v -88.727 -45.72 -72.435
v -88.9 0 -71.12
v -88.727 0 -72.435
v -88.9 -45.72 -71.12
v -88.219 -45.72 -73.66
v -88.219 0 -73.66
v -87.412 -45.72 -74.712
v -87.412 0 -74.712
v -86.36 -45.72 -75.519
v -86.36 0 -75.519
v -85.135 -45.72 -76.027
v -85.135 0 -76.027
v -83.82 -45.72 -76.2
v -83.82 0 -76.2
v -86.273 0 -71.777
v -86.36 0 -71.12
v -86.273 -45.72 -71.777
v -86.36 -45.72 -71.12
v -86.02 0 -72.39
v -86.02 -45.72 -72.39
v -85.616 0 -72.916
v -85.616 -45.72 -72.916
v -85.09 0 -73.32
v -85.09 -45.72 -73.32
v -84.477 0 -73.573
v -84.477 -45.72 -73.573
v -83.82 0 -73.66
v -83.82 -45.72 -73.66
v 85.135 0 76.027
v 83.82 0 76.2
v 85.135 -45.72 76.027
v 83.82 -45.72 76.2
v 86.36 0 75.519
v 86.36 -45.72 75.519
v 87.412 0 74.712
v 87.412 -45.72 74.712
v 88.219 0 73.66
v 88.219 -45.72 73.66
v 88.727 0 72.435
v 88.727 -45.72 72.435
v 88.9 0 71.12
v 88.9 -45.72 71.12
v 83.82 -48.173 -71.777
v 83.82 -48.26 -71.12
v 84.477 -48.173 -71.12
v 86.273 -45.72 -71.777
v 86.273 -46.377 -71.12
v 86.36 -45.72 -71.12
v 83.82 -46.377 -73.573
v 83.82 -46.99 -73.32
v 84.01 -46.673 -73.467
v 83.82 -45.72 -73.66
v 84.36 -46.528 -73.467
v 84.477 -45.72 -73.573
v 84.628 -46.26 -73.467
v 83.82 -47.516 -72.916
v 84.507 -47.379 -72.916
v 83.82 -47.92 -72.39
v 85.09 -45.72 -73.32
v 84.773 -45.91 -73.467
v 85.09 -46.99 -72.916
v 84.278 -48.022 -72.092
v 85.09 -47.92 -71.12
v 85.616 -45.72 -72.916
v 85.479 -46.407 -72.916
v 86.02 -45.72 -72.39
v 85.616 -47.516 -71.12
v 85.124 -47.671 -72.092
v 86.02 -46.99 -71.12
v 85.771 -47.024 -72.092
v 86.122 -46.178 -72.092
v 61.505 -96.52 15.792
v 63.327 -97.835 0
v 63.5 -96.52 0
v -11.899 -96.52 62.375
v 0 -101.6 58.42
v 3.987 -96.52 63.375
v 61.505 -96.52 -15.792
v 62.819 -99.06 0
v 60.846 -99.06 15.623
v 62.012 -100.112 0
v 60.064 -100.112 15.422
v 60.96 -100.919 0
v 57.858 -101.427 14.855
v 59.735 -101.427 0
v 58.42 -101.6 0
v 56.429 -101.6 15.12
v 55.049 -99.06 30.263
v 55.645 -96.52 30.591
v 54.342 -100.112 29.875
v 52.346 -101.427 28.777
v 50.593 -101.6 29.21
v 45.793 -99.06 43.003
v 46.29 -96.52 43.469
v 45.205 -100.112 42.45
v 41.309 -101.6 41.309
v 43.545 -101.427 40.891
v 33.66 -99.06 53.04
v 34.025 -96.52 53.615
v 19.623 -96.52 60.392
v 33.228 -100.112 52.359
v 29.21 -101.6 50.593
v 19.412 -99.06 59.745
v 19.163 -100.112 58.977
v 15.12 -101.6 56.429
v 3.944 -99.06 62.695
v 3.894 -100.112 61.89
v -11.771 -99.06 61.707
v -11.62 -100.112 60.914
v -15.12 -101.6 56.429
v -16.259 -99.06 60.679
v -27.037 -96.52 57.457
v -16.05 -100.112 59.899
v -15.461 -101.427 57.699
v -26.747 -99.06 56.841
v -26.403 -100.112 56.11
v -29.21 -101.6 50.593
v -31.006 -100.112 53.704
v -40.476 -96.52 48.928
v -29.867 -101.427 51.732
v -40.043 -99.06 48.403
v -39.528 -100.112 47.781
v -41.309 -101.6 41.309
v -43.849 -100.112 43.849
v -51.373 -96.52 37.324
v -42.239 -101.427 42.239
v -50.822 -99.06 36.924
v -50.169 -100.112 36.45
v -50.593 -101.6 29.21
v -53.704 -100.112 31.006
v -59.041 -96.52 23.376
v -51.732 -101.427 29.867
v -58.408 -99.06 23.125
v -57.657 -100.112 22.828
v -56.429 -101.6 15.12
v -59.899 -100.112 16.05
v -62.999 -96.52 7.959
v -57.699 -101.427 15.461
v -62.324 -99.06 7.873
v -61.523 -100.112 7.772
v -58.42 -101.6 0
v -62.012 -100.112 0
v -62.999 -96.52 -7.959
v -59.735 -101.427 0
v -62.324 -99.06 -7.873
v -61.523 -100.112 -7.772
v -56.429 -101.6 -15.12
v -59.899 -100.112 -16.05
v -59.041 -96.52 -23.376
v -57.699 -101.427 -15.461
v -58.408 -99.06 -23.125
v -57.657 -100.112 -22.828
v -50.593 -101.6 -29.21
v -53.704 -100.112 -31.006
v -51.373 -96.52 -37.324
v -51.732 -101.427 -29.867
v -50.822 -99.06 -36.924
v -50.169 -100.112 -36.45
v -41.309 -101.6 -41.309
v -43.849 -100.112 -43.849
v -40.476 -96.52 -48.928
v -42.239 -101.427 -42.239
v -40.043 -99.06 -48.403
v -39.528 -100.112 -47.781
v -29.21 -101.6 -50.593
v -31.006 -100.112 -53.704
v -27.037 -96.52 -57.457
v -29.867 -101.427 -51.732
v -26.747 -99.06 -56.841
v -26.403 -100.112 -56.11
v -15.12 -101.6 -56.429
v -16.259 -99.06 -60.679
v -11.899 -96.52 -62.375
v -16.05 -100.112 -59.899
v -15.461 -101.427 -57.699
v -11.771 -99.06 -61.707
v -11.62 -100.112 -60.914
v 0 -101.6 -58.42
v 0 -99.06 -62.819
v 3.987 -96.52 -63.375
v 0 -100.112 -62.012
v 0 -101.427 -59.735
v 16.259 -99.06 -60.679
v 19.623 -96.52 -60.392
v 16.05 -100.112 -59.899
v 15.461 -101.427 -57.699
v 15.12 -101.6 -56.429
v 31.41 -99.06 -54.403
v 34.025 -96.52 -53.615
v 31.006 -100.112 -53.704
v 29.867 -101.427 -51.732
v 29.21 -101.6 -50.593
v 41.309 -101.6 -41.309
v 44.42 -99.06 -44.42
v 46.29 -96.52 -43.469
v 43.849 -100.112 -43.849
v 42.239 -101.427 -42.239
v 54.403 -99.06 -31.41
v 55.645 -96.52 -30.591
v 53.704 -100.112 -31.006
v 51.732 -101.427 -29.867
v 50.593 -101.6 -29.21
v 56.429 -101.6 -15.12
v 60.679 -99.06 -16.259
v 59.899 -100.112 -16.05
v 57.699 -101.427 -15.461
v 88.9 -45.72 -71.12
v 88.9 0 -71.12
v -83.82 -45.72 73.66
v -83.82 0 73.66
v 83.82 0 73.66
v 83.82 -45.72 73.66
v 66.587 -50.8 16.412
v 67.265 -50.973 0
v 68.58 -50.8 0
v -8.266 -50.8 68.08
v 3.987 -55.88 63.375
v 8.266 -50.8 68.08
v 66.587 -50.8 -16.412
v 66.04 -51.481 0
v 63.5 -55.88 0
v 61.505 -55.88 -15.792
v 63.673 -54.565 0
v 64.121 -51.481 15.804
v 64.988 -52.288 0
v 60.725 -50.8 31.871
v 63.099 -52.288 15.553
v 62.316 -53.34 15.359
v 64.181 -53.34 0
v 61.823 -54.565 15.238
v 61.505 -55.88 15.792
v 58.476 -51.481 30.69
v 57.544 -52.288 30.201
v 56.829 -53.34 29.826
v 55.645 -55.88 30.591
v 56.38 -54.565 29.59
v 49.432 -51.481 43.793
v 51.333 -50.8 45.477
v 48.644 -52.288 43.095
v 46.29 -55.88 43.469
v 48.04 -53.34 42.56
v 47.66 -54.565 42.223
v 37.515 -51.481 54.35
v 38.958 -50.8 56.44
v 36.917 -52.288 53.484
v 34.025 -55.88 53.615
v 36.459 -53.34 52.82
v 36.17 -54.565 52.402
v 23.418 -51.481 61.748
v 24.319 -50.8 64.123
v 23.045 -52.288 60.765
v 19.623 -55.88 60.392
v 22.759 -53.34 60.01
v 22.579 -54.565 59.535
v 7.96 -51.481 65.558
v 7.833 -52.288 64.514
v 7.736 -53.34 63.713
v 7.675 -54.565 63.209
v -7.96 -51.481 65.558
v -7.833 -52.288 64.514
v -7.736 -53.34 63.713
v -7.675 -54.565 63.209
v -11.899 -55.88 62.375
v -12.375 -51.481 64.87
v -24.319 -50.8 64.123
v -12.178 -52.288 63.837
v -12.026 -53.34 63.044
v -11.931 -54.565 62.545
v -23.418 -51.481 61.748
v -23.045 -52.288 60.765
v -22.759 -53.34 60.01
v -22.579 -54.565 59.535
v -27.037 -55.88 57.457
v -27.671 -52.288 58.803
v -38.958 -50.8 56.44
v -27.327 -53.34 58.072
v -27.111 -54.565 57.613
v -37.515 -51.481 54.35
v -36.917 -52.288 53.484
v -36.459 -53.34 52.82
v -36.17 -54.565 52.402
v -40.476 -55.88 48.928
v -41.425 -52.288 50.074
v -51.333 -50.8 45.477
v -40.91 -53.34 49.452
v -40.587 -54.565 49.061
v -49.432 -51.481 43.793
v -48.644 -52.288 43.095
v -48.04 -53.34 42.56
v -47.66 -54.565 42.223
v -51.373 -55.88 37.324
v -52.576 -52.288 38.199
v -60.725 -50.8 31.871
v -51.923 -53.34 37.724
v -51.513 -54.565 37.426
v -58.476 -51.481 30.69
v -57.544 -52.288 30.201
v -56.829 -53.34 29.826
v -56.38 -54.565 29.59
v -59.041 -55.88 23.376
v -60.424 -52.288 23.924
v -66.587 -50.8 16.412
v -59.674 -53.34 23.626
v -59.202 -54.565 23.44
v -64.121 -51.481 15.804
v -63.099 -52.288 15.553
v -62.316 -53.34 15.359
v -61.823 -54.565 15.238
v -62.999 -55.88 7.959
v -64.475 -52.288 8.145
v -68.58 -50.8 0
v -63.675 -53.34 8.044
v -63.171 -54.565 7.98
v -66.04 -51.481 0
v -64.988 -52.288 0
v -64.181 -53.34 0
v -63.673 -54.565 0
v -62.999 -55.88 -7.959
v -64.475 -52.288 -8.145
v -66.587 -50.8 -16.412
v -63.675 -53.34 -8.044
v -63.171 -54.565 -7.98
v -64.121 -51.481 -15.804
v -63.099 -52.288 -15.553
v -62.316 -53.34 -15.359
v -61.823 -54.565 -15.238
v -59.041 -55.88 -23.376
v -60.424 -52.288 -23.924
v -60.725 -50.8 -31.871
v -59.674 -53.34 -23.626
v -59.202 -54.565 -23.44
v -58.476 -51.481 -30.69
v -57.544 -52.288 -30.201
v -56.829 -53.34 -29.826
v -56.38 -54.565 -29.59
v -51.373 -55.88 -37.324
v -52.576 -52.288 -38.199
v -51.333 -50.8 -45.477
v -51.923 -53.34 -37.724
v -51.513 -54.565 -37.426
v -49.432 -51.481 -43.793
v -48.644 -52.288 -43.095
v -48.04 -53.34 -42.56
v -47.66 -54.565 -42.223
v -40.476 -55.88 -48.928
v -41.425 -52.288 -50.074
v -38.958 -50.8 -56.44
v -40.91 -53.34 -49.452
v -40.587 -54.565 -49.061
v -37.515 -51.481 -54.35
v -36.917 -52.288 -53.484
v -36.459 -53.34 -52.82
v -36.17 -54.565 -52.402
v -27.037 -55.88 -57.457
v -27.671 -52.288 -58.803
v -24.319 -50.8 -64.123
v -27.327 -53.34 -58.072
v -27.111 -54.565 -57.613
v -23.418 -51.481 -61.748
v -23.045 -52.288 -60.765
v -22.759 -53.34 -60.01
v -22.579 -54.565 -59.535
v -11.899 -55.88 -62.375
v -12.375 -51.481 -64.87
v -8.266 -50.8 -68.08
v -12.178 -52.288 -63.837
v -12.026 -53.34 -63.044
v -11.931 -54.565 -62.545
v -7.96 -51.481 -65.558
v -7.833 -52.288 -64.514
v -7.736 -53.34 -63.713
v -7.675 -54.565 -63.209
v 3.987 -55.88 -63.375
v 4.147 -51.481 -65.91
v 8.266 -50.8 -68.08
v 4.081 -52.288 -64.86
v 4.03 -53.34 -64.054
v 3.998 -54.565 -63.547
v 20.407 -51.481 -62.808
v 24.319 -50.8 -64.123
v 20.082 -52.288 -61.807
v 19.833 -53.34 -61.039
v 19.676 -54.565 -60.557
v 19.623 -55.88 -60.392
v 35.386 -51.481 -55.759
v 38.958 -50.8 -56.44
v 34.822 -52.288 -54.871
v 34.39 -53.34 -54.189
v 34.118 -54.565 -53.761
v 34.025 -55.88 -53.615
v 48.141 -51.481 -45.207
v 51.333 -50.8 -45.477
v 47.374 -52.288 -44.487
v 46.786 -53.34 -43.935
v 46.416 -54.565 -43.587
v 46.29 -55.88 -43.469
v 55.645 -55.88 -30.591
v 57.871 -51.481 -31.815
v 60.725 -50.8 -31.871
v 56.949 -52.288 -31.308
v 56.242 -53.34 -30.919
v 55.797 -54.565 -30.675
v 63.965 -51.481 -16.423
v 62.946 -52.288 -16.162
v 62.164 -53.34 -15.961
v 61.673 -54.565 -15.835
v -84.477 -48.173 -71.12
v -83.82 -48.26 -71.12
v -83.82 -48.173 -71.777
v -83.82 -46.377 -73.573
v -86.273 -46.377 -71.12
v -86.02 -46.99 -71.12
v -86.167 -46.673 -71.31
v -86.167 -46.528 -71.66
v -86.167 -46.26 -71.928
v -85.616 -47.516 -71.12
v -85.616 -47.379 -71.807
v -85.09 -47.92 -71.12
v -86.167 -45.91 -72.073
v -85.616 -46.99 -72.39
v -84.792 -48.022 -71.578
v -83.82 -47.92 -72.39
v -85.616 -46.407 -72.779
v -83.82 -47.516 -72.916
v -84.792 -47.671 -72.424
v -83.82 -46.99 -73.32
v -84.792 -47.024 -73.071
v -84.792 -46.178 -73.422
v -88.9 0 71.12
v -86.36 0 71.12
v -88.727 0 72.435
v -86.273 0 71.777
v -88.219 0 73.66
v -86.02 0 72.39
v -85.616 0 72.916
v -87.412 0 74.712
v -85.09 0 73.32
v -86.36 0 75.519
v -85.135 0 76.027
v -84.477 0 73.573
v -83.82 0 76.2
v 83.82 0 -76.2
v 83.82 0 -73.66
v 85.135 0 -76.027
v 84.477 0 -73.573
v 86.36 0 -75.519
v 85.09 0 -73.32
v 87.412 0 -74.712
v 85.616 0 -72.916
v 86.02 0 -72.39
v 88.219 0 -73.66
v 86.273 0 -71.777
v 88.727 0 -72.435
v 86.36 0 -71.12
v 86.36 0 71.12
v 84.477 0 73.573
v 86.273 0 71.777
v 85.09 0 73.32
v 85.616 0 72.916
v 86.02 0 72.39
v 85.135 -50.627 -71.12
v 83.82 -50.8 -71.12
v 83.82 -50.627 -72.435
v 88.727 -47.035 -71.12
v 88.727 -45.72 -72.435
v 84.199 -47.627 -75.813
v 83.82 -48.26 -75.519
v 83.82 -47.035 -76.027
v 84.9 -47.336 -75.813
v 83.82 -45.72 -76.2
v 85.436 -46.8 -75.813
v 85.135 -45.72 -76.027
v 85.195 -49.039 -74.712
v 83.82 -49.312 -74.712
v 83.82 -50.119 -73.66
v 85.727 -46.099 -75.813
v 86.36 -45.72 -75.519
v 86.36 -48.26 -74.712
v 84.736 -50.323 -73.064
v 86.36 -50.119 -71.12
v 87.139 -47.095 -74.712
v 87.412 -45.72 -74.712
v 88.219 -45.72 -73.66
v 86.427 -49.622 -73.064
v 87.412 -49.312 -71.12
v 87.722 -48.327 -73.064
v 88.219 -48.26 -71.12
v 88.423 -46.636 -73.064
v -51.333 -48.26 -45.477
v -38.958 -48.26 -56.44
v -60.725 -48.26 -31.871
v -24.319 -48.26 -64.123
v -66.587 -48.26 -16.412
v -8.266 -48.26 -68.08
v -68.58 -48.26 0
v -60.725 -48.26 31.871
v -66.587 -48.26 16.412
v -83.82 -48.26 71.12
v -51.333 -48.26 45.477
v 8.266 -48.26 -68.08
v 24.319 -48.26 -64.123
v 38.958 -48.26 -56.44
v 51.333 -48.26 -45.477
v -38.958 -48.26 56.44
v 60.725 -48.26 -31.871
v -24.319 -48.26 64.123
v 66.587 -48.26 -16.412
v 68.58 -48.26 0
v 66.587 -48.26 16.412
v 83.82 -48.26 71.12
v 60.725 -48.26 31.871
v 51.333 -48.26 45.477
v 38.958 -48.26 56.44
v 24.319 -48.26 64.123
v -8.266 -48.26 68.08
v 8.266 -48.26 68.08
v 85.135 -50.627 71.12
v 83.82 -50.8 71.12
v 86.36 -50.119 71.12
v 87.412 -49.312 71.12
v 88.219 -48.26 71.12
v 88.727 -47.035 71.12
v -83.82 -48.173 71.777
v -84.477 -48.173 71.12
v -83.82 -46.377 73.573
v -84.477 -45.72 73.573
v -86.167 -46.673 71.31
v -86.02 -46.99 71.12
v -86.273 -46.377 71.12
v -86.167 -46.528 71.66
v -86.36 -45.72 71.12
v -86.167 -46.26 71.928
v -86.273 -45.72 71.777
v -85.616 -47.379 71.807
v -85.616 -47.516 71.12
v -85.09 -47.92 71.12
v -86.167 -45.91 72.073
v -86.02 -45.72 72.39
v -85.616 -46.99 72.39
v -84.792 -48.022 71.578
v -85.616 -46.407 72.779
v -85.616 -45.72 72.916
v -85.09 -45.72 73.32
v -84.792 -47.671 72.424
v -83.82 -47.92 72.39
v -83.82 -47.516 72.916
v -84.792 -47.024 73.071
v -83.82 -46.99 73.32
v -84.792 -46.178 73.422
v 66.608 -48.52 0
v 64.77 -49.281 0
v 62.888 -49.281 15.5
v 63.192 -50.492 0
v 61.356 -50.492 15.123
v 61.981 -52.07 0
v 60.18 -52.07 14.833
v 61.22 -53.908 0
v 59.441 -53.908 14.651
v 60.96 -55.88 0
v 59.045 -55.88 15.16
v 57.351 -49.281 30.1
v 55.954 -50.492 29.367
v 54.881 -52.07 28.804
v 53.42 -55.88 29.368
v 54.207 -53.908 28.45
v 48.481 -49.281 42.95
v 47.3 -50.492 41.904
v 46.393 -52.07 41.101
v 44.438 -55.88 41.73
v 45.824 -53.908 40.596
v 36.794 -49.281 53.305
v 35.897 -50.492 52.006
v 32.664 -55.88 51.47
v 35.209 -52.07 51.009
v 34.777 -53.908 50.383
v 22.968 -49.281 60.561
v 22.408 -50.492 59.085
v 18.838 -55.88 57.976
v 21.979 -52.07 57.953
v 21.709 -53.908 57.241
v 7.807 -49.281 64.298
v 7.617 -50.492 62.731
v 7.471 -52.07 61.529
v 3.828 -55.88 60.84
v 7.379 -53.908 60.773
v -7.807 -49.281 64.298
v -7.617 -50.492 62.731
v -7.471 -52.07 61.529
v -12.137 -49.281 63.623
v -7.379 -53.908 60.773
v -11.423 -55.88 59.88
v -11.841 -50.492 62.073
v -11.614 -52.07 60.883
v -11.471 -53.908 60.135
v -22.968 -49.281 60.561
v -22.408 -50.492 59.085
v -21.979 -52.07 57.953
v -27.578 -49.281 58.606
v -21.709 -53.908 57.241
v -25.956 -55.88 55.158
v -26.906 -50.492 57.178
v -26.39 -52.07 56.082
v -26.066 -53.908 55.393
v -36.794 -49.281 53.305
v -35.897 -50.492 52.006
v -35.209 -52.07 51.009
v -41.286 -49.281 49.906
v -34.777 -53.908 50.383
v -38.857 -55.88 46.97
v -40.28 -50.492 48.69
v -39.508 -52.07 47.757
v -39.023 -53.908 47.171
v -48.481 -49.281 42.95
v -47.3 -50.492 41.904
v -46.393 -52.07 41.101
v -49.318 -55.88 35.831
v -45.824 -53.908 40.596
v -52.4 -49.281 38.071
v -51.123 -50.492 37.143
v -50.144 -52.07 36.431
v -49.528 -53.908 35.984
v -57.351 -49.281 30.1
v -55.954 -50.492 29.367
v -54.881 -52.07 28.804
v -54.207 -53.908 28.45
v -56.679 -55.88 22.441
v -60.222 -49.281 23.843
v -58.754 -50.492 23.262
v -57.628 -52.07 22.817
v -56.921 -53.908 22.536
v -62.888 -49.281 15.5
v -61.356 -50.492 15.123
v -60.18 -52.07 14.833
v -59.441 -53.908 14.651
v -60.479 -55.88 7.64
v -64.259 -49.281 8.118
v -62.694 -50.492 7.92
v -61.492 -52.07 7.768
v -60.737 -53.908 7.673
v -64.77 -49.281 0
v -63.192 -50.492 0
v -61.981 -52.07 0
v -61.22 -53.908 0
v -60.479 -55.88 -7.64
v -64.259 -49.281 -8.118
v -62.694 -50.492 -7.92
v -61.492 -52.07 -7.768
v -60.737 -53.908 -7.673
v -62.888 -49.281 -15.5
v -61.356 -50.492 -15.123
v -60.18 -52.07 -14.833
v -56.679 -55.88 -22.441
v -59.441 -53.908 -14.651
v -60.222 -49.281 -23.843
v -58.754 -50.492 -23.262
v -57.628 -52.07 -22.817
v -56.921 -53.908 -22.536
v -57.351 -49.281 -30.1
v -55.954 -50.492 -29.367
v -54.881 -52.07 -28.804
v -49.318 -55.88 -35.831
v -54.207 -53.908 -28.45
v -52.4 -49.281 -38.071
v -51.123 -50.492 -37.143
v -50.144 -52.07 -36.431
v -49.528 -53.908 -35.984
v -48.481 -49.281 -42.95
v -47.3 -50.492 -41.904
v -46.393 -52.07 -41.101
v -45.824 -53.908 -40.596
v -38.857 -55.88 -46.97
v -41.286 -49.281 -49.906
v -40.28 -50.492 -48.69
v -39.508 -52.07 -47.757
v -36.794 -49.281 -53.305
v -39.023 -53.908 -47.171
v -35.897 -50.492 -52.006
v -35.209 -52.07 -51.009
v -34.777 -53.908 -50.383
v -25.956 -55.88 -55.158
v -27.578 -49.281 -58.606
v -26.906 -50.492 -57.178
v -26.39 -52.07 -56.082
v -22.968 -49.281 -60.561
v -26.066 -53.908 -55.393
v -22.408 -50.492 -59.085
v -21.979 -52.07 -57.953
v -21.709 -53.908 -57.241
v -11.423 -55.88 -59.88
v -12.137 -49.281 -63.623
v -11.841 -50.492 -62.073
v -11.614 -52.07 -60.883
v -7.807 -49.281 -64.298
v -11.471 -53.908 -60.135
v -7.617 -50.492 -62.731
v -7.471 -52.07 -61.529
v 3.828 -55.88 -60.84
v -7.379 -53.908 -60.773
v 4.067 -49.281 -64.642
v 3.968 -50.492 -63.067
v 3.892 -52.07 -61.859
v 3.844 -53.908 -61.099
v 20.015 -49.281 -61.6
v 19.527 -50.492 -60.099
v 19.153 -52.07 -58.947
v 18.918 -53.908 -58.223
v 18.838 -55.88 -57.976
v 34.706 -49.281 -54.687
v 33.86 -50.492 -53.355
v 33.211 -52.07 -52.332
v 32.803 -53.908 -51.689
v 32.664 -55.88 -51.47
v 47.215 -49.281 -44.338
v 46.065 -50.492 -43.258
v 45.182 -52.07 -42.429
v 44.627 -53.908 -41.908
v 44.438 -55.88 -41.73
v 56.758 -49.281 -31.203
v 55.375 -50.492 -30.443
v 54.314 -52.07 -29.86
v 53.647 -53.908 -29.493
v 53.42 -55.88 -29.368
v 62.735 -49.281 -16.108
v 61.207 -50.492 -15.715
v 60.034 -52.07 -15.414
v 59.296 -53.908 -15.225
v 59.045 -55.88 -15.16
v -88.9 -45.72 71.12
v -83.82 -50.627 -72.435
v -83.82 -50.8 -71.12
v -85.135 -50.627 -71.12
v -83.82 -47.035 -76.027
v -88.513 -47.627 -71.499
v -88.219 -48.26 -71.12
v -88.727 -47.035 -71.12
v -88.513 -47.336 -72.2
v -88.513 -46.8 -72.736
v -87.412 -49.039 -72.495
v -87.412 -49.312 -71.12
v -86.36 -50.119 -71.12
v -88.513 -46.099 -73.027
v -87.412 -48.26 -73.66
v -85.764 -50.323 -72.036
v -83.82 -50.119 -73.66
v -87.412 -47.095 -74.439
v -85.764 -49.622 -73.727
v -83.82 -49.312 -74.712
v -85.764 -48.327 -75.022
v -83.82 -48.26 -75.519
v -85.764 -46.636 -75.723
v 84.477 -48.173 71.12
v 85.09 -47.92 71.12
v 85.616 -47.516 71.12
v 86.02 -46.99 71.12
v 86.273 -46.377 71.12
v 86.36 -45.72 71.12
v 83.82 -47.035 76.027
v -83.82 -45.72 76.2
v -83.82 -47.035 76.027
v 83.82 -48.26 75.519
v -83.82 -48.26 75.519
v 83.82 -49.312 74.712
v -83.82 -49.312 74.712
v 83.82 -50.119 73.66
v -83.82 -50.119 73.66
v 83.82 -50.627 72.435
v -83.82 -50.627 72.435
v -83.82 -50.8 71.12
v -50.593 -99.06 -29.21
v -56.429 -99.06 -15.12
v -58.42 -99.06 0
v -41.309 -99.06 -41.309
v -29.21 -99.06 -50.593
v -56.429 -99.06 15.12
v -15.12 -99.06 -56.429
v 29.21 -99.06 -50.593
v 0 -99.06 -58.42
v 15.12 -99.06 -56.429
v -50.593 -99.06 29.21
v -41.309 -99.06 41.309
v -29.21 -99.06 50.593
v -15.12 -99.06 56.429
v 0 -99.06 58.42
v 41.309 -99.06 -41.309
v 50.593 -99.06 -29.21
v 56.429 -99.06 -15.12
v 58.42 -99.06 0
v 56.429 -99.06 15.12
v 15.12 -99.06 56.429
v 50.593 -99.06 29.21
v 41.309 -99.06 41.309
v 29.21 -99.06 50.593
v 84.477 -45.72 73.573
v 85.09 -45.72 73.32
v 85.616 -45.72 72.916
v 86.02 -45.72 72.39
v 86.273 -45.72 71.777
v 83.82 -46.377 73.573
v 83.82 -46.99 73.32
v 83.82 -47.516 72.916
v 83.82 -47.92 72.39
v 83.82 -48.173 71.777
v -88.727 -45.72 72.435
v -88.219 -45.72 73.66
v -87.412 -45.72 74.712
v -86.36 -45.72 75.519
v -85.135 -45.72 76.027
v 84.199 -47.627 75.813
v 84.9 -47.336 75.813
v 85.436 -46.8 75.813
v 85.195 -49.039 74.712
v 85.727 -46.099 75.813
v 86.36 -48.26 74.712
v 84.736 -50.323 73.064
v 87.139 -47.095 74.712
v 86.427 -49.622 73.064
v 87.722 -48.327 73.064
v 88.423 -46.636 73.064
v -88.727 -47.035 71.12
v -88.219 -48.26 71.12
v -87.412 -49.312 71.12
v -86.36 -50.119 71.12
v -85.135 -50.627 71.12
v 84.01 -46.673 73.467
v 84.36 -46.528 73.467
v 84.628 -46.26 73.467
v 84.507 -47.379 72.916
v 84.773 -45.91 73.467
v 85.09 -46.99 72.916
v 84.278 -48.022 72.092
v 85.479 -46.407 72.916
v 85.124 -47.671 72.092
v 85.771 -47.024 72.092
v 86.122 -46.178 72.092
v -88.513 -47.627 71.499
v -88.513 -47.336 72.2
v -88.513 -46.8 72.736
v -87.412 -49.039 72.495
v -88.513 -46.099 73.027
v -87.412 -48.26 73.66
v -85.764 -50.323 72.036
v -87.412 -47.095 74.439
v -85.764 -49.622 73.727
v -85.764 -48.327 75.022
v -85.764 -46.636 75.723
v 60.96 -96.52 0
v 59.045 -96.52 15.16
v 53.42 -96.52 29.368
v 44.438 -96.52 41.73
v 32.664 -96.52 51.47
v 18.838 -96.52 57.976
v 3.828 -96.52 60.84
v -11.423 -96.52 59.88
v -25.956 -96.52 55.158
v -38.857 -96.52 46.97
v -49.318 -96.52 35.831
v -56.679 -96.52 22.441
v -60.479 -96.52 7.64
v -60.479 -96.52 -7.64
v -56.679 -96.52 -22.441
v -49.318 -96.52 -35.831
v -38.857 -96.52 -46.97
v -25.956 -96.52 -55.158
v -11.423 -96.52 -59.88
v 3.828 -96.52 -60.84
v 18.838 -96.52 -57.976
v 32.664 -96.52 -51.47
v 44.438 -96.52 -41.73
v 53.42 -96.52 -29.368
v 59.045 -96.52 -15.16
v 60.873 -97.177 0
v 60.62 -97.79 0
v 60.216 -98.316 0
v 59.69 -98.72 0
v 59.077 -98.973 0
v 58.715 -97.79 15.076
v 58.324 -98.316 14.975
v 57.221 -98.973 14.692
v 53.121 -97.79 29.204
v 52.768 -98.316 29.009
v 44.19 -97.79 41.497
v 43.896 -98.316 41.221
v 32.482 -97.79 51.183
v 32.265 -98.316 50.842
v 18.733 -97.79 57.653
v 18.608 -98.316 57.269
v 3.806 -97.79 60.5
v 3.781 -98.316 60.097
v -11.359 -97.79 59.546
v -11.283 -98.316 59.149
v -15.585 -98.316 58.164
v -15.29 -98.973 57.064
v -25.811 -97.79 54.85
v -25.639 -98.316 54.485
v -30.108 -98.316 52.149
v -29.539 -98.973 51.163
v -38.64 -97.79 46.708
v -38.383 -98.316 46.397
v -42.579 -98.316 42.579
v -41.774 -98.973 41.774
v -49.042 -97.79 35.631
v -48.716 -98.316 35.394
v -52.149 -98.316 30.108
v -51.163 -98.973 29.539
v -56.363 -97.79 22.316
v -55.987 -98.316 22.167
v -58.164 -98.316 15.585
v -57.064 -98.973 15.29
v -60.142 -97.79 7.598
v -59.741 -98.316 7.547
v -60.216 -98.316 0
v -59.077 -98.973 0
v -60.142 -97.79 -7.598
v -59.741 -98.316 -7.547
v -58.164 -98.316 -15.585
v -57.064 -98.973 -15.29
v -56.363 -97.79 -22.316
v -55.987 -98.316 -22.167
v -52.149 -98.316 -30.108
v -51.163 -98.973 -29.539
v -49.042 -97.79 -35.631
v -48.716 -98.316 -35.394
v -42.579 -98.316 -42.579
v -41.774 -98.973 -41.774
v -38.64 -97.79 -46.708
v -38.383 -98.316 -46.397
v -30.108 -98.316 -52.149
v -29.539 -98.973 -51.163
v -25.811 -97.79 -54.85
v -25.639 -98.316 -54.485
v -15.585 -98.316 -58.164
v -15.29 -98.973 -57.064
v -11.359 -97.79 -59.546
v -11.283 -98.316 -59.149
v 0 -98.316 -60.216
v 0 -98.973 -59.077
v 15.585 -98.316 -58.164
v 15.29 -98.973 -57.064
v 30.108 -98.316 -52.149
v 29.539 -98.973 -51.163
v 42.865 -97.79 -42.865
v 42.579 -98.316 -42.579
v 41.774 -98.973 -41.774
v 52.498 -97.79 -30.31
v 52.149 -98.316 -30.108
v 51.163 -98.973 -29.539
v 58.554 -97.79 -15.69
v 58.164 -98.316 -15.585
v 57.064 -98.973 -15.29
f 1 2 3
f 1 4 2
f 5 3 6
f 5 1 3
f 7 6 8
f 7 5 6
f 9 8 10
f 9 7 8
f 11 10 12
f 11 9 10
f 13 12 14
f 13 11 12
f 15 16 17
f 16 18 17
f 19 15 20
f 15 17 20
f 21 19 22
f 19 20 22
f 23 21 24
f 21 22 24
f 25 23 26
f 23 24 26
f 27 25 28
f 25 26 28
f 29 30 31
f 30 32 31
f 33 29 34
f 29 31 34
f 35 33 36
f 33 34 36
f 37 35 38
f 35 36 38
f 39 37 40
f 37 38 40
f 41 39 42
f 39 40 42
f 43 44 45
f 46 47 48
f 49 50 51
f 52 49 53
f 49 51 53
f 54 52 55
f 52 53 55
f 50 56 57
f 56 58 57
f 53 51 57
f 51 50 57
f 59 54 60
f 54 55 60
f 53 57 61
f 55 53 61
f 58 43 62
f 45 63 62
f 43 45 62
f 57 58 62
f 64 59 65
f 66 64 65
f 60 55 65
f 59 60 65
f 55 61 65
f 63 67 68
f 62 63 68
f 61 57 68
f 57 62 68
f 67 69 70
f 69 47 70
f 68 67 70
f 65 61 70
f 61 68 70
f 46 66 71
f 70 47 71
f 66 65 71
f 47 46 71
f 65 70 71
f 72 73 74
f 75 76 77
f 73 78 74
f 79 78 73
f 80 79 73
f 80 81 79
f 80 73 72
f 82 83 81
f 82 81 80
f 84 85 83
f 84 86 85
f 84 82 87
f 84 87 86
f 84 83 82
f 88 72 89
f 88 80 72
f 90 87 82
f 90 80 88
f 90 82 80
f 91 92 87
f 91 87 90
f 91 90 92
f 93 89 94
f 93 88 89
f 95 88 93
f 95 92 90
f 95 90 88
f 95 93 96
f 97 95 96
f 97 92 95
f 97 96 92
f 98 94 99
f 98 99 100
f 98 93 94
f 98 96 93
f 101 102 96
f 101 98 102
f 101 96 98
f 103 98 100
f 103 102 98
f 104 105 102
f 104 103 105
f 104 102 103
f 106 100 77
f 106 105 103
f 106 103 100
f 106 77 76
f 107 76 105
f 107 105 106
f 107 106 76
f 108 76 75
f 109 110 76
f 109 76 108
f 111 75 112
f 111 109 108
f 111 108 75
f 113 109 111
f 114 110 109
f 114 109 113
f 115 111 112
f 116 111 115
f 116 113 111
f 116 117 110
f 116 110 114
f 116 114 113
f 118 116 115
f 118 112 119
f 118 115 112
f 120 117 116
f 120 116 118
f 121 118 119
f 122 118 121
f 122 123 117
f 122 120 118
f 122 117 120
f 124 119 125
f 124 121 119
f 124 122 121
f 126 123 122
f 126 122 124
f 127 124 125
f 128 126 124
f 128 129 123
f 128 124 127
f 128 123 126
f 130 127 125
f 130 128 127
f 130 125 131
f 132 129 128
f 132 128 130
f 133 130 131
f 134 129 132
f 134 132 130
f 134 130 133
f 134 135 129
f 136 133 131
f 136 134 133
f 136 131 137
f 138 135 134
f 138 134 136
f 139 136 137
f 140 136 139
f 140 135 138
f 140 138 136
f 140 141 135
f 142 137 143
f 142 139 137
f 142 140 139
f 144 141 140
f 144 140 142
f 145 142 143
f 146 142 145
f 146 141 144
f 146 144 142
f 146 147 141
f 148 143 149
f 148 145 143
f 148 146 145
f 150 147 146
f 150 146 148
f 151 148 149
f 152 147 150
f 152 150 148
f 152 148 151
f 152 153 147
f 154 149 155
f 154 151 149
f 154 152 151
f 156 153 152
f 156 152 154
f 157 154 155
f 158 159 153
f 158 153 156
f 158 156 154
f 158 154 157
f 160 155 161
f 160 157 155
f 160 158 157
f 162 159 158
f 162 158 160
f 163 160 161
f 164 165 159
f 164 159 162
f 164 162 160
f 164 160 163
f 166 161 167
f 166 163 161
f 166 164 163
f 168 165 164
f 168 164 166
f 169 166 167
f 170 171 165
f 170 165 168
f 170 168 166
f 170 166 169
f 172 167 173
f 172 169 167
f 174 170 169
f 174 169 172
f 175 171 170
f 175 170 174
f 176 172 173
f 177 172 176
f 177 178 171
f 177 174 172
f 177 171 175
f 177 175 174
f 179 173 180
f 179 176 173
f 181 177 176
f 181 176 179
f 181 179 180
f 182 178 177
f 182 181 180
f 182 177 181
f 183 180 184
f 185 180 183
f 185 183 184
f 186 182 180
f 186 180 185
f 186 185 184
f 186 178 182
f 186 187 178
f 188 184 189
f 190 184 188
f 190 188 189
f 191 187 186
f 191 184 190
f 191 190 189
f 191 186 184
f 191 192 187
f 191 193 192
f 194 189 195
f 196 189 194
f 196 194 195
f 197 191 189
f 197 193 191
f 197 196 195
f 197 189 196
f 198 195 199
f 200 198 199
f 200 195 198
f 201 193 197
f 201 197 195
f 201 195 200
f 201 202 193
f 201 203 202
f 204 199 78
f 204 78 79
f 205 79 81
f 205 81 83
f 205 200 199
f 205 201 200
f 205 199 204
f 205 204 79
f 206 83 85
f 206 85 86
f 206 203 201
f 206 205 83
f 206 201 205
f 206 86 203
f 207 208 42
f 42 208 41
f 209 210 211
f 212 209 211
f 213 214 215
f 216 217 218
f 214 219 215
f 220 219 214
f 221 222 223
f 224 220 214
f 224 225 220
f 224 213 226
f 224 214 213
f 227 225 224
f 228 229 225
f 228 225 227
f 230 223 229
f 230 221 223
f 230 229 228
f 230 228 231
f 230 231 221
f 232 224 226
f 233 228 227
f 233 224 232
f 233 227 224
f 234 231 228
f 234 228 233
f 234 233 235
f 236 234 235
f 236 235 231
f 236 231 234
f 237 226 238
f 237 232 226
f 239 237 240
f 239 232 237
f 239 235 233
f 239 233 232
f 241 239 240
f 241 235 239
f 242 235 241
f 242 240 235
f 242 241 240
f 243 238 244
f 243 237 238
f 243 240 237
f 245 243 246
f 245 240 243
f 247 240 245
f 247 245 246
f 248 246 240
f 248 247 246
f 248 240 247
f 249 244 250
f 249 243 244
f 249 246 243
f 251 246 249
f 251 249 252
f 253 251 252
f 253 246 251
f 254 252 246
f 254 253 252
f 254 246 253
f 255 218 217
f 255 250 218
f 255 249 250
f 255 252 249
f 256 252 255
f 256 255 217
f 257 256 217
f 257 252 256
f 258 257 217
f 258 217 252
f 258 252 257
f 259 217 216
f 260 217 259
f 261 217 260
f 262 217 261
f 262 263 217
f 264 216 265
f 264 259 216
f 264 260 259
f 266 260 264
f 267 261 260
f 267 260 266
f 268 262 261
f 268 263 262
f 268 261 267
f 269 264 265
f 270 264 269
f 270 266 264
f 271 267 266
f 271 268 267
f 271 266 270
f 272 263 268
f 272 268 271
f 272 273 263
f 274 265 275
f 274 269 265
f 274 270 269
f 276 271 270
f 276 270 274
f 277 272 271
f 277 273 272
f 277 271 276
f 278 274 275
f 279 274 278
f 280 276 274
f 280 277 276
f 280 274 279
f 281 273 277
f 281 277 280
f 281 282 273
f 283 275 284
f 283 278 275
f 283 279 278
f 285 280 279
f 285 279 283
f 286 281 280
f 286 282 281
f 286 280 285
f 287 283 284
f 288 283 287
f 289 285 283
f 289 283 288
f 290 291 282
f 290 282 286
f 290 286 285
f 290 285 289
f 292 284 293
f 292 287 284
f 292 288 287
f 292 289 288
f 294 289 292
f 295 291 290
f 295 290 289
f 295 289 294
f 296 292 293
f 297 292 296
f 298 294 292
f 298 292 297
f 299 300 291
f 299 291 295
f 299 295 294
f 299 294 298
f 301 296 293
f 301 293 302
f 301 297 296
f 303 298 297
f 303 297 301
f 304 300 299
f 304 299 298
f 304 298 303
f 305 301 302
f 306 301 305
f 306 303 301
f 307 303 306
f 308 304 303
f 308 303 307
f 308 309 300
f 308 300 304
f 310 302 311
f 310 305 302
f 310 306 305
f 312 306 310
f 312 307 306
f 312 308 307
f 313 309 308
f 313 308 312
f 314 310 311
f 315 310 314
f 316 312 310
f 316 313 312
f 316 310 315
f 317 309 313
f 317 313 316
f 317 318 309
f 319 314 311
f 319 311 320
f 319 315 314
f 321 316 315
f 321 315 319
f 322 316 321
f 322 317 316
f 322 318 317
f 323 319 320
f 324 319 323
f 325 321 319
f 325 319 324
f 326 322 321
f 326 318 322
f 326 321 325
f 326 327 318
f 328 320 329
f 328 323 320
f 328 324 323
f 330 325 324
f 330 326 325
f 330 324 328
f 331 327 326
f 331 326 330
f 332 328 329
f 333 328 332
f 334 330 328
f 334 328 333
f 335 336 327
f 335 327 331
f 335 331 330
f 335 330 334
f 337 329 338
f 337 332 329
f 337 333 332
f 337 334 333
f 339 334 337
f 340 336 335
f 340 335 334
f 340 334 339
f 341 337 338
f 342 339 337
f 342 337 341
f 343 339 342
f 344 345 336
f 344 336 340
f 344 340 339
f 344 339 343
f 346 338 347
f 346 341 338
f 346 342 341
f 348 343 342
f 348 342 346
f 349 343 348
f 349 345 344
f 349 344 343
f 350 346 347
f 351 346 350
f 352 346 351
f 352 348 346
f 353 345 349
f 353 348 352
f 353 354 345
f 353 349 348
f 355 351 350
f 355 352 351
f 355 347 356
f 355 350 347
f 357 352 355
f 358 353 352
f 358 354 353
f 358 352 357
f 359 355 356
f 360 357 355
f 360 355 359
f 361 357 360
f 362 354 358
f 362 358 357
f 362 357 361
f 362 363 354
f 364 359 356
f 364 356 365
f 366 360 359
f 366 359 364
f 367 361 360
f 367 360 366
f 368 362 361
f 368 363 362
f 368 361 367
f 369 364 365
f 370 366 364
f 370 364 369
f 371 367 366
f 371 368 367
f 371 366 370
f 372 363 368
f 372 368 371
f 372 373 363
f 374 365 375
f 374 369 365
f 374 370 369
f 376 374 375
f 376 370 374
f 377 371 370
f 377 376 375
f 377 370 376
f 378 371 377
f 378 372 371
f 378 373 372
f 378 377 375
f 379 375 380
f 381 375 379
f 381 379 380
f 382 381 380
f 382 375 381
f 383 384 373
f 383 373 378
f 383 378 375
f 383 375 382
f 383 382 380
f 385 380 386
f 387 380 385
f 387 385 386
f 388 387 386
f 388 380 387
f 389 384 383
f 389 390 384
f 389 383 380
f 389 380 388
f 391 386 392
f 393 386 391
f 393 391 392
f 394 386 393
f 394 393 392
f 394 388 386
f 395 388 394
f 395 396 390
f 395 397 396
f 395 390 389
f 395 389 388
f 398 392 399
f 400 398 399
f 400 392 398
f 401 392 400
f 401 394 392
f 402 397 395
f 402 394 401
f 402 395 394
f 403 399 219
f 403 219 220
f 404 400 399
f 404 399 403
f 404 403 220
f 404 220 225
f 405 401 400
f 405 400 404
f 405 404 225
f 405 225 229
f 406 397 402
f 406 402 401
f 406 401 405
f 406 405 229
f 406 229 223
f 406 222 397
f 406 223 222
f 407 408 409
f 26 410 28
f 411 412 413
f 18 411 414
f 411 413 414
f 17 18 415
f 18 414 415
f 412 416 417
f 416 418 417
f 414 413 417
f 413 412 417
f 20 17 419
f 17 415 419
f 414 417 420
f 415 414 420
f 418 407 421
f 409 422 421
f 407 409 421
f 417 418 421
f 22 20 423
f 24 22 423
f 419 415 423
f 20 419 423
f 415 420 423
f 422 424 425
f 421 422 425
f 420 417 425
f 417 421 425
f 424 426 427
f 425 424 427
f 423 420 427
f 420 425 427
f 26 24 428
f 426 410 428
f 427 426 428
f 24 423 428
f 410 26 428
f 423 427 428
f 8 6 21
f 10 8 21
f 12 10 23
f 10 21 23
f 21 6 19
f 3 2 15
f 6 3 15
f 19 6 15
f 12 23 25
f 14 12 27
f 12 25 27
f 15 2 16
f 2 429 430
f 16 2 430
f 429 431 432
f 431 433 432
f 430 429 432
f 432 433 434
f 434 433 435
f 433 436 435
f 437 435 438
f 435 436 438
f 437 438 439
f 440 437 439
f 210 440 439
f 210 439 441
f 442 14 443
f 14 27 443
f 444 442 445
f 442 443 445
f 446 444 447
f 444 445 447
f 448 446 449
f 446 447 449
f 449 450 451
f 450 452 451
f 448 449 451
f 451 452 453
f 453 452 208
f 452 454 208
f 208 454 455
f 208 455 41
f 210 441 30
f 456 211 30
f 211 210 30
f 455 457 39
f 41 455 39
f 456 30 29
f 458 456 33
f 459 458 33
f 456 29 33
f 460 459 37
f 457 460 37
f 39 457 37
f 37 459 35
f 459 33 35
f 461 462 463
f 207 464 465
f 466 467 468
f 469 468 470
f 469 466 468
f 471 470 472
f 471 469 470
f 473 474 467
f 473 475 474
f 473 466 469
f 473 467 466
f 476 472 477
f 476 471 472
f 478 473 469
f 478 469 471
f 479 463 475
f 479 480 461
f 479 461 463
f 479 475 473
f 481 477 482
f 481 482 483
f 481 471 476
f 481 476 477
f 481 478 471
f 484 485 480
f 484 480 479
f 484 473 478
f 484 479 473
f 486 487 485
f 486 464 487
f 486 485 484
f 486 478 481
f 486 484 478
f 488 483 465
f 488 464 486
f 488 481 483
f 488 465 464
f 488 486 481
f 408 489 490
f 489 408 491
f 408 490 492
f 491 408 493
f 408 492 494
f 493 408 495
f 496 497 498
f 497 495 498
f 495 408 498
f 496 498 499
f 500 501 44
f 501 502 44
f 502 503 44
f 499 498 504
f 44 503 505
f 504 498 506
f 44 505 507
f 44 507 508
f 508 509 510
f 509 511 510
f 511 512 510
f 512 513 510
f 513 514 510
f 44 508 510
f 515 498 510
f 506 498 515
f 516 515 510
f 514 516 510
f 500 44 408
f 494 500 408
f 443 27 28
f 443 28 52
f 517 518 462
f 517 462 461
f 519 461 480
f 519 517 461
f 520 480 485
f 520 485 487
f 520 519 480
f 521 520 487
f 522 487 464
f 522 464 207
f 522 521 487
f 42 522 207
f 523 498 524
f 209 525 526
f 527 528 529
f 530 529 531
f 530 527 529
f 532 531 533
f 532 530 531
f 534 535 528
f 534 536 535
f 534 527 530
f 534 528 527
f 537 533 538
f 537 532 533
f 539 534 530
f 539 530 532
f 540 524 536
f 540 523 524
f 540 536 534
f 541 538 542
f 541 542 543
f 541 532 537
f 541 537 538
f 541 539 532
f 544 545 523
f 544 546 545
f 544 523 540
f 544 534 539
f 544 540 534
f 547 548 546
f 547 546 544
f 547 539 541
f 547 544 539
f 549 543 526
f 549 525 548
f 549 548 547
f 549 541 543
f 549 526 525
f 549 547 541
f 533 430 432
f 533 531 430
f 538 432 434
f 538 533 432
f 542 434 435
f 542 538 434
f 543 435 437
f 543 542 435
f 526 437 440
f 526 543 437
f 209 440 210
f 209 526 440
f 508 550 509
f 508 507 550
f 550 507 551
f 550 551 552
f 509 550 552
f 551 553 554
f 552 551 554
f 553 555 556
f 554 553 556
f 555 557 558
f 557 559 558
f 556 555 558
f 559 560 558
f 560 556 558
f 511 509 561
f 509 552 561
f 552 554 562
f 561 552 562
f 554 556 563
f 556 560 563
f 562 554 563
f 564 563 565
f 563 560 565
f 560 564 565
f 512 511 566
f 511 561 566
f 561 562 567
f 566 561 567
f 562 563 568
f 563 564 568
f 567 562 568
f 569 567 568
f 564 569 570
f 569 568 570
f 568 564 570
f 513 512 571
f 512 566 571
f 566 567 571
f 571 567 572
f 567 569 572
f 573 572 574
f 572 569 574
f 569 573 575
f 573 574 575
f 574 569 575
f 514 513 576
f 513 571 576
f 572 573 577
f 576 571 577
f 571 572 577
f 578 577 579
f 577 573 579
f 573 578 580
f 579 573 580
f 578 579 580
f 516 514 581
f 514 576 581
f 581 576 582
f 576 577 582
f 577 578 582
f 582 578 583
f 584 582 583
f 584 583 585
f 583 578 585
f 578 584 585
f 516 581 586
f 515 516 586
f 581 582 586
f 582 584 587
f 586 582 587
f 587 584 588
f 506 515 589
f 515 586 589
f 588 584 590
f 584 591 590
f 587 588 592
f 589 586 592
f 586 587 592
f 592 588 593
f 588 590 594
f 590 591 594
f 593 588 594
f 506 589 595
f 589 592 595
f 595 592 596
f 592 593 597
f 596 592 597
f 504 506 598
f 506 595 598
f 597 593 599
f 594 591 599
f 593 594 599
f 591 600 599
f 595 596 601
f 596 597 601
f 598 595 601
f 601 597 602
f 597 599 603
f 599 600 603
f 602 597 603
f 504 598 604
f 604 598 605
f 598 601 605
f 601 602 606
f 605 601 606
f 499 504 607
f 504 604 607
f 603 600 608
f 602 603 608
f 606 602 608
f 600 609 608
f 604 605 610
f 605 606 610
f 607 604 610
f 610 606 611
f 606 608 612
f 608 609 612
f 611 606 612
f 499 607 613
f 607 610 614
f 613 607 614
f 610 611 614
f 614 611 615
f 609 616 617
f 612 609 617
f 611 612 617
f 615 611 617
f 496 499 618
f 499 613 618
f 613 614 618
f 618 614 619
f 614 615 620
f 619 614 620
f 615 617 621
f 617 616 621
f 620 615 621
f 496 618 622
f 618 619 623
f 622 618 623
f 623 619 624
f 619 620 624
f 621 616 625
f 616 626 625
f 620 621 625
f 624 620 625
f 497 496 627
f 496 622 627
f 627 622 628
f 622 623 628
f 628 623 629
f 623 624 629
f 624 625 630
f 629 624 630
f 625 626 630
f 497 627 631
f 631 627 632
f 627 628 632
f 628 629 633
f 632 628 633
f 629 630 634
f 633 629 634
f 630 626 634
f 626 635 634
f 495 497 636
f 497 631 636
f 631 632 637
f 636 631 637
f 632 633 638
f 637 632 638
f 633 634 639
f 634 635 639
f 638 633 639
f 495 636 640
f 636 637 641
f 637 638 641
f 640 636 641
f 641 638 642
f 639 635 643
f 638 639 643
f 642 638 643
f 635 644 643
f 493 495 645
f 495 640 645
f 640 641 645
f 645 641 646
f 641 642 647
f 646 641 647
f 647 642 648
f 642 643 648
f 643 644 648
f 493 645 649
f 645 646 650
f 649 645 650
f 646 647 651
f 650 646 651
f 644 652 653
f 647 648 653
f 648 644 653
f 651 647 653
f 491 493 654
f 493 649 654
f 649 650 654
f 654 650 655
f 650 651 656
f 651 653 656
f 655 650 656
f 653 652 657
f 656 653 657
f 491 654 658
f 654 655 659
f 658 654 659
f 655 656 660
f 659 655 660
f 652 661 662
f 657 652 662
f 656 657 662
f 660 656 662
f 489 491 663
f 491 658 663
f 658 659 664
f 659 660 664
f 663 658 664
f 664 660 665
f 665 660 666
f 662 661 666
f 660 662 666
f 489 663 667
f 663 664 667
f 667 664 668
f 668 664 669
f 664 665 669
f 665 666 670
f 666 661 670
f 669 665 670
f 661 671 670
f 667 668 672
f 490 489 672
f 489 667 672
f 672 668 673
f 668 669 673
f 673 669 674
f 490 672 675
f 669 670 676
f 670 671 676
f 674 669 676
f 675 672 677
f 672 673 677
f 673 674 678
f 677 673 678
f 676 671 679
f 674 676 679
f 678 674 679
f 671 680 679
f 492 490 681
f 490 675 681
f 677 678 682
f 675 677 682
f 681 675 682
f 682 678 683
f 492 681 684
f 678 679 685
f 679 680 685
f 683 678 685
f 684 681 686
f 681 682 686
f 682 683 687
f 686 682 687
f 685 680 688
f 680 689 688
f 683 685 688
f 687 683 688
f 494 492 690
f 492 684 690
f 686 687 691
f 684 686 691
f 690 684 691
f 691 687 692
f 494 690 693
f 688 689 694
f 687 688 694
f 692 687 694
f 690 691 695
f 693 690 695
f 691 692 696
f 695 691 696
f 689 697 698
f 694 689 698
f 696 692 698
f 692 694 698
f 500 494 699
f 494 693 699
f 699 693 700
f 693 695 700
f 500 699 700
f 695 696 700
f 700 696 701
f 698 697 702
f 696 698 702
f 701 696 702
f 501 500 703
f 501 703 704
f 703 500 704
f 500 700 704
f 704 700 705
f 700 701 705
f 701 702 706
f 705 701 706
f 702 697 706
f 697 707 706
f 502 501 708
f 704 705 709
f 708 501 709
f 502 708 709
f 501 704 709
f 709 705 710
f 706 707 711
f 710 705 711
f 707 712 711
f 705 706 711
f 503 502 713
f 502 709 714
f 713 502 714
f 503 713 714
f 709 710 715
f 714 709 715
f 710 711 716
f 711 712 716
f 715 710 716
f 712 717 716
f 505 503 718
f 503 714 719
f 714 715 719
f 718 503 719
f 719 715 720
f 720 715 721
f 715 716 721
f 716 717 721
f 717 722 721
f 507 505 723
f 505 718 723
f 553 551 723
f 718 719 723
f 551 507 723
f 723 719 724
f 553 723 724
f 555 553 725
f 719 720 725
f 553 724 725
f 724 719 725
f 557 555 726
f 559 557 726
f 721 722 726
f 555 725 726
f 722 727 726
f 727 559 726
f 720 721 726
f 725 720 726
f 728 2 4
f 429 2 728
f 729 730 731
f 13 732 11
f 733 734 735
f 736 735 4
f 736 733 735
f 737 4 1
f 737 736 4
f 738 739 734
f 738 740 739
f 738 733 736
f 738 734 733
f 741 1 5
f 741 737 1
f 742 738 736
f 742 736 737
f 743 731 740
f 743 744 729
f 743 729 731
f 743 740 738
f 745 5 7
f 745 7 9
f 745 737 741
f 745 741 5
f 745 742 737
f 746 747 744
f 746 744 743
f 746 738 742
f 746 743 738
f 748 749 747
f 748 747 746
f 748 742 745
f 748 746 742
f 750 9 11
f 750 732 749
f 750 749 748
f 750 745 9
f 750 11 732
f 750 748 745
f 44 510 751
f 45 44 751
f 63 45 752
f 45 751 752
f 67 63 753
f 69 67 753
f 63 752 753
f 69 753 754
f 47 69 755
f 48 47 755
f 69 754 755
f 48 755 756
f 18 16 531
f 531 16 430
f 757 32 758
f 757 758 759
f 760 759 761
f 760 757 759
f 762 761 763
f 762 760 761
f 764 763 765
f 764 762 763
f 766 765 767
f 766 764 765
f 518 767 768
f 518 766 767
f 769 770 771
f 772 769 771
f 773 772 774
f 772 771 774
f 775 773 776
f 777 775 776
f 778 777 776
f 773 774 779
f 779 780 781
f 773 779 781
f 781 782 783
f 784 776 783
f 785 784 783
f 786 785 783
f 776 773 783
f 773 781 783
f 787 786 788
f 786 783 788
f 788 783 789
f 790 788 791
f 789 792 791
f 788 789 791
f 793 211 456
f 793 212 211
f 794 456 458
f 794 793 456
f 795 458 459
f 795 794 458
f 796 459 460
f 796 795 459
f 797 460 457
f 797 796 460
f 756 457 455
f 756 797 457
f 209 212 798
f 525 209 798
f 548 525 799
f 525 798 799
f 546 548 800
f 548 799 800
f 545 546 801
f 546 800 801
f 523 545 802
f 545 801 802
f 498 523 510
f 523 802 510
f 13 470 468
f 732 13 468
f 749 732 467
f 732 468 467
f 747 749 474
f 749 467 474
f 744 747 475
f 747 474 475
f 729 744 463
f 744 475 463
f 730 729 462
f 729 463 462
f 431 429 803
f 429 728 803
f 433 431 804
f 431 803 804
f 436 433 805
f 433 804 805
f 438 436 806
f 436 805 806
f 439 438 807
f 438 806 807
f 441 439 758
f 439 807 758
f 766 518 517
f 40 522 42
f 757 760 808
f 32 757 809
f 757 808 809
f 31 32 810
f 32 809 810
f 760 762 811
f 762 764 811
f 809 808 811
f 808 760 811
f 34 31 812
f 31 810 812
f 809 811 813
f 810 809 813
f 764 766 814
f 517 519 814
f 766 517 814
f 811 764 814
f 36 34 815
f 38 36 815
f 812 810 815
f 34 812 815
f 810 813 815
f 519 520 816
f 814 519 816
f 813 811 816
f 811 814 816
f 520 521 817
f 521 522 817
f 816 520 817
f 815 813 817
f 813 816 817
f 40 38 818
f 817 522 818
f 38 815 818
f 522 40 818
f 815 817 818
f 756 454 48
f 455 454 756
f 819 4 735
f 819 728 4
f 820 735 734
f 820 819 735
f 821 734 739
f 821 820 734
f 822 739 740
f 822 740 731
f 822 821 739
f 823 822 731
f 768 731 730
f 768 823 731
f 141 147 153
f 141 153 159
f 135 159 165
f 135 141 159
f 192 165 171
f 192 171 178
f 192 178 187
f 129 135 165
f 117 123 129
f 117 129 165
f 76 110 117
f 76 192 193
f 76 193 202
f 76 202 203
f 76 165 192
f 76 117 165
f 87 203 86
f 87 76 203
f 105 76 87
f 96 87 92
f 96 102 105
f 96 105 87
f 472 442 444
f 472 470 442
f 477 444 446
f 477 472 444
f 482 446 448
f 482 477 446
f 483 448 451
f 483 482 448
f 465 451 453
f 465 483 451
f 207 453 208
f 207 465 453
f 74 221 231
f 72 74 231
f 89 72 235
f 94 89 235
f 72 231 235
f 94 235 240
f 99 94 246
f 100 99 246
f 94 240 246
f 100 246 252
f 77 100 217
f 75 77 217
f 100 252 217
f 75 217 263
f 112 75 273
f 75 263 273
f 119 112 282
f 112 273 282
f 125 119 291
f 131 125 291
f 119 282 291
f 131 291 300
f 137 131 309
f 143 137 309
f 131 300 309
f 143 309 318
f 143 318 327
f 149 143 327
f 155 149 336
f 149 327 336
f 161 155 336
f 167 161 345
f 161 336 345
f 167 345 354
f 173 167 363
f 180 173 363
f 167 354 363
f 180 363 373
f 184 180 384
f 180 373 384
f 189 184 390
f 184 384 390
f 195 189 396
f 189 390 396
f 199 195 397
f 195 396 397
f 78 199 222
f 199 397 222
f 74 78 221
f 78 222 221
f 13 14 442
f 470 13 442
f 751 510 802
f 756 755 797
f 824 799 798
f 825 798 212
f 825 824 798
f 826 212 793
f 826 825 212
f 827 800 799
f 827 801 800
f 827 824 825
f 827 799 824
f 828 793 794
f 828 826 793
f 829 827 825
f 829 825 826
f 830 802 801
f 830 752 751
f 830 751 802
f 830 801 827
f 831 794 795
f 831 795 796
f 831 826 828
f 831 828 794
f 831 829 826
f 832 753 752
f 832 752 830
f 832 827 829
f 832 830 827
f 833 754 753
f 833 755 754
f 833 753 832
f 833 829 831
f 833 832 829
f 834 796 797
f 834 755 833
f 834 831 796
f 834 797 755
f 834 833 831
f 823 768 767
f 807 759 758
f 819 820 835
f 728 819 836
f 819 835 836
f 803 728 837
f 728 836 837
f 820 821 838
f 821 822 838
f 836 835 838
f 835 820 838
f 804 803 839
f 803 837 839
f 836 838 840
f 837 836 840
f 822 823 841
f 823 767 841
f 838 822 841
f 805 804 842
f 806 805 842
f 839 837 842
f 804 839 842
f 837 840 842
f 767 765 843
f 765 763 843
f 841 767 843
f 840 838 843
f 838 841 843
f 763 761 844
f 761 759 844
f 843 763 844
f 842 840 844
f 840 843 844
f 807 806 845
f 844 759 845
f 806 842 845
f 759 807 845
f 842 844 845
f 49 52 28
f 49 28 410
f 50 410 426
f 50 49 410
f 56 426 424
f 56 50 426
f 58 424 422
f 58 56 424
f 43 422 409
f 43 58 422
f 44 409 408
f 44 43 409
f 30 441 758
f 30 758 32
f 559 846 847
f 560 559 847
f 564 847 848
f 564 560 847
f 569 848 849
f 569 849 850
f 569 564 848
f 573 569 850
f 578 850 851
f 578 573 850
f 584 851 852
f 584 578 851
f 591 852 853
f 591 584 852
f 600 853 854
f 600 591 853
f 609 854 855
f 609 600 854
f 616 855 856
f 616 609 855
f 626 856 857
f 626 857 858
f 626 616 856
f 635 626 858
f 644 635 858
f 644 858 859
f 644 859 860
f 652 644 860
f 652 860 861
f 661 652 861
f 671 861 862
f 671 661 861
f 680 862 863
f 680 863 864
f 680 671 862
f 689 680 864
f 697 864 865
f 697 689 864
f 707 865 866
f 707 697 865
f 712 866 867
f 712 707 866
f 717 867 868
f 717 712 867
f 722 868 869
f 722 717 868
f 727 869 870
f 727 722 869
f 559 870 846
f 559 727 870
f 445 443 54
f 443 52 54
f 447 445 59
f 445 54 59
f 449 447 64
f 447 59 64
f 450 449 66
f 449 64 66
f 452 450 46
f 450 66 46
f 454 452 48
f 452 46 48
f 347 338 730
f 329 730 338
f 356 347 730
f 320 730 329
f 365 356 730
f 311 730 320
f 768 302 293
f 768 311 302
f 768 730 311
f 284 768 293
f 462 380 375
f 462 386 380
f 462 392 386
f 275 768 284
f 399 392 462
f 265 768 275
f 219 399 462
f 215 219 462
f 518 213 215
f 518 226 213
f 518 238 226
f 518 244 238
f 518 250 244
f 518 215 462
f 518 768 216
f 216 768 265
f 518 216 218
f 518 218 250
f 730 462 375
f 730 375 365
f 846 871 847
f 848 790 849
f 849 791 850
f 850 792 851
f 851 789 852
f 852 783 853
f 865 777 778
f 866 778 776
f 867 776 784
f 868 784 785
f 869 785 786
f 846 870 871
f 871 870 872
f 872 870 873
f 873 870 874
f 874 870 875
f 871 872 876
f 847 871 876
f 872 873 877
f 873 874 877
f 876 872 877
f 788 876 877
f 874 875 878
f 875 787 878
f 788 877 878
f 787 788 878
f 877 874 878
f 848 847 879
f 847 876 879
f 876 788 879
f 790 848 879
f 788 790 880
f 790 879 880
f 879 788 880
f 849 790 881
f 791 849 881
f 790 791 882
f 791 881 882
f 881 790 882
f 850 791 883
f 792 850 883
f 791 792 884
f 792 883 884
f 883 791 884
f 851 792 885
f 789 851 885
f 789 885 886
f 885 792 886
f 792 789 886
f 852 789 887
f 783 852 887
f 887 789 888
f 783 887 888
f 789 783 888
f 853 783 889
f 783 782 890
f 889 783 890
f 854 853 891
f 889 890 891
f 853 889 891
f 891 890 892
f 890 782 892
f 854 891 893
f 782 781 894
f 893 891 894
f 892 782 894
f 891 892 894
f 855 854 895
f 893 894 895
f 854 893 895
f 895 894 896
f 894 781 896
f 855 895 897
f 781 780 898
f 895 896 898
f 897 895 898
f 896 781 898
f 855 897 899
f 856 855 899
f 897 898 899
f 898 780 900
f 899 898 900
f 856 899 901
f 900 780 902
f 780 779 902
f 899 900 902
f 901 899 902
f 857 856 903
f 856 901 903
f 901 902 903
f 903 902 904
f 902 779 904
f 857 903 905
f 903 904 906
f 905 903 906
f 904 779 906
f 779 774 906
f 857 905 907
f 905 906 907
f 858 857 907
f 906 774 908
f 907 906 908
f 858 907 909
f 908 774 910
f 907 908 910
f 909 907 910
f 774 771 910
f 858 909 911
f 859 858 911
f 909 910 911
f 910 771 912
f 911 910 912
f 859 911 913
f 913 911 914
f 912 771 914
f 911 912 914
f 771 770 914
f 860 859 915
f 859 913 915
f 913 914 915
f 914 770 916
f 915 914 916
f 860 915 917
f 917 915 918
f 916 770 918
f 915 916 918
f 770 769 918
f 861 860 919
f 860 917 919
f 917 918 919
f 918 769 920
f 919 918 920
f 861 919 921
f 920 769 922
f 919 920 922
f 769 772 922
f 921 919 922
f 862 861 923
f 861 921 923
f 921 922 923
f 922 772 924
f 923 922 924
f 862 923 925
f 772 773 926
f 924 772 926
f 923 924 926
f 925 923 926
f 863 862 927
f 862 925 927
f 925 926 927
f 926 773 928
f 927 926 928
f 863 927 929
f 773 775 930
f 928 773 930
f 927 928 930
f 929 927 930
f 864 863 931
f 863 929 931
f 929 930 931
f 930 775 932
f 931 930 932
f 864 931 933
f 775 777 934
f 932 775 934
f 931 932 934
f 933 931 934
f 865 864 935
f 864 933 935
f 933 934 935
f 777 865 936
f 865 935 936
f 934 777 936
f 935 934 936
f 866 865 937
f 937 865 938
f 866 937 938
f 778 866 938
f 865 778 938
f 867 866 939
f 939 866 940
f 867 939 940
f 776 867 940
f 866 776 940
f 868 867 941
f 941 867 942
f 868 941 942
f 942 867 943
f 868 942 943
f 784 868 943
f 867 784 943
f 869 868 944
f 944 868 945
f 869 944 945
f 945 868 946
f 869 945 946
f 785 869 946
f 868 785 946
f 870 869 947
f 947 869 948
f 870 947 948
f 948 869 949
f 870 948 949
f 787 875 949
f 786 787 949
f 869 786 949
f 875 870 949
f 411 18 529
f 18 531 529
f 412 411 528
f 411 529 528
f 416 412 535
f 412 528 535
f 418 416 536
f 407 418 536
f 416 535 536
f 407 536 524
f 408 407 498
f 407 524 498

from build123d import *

# Parameters (mm, degrees)
F0_W     = 177.8
F0_H     = 152.4
F1_DEPTH = 50.8
F2_R     = 63.5
F3_DEPTH = 50.8
F4_R     = 5.08
F5_T     = -2.54


with BuildPart() as f1:
    # F0 (on Front) → F1 (new body)
    with BuildSketch(Plane.XZ):
        Rectangle(F0_W, F0_H)
    extrude(amount=F1_DEPTH)

    # F2 (on face) → F3 (join)
    with BuildSketch(Plane.XZ.offset(50.8)):
        Circle(F2_R)
    extrude(amount=F3_DEPTH)

    # F4
    f4_edges = [f1.edges().sort_by_distance(p)[0] for p in [
        (-63.5, -101.6, 0),
        (-63.5, -50.8, 0),
        (88.9, -50.8, 0),
        (0, -50.8, -76.2),
        (0, -50.8, 76.2),
        (-88.9, -50.8, 0),
        (88.9, -25.4, 76.2),
        (-88.9, -25.4, 76.2),
        (-88.9, -25.4, -76.2),
        (88.9, -25.4, -76.2),
    ]]
    fillet(f4_edges, radius=F4_R)

    # F5
    f5_openings = [f1.faces().sort_by_distance(p)[0] for p in [
        (0, 0, 0),
    ]]
    offset(amount=F5_T, openings=f5_openings)


solid = f1.part
